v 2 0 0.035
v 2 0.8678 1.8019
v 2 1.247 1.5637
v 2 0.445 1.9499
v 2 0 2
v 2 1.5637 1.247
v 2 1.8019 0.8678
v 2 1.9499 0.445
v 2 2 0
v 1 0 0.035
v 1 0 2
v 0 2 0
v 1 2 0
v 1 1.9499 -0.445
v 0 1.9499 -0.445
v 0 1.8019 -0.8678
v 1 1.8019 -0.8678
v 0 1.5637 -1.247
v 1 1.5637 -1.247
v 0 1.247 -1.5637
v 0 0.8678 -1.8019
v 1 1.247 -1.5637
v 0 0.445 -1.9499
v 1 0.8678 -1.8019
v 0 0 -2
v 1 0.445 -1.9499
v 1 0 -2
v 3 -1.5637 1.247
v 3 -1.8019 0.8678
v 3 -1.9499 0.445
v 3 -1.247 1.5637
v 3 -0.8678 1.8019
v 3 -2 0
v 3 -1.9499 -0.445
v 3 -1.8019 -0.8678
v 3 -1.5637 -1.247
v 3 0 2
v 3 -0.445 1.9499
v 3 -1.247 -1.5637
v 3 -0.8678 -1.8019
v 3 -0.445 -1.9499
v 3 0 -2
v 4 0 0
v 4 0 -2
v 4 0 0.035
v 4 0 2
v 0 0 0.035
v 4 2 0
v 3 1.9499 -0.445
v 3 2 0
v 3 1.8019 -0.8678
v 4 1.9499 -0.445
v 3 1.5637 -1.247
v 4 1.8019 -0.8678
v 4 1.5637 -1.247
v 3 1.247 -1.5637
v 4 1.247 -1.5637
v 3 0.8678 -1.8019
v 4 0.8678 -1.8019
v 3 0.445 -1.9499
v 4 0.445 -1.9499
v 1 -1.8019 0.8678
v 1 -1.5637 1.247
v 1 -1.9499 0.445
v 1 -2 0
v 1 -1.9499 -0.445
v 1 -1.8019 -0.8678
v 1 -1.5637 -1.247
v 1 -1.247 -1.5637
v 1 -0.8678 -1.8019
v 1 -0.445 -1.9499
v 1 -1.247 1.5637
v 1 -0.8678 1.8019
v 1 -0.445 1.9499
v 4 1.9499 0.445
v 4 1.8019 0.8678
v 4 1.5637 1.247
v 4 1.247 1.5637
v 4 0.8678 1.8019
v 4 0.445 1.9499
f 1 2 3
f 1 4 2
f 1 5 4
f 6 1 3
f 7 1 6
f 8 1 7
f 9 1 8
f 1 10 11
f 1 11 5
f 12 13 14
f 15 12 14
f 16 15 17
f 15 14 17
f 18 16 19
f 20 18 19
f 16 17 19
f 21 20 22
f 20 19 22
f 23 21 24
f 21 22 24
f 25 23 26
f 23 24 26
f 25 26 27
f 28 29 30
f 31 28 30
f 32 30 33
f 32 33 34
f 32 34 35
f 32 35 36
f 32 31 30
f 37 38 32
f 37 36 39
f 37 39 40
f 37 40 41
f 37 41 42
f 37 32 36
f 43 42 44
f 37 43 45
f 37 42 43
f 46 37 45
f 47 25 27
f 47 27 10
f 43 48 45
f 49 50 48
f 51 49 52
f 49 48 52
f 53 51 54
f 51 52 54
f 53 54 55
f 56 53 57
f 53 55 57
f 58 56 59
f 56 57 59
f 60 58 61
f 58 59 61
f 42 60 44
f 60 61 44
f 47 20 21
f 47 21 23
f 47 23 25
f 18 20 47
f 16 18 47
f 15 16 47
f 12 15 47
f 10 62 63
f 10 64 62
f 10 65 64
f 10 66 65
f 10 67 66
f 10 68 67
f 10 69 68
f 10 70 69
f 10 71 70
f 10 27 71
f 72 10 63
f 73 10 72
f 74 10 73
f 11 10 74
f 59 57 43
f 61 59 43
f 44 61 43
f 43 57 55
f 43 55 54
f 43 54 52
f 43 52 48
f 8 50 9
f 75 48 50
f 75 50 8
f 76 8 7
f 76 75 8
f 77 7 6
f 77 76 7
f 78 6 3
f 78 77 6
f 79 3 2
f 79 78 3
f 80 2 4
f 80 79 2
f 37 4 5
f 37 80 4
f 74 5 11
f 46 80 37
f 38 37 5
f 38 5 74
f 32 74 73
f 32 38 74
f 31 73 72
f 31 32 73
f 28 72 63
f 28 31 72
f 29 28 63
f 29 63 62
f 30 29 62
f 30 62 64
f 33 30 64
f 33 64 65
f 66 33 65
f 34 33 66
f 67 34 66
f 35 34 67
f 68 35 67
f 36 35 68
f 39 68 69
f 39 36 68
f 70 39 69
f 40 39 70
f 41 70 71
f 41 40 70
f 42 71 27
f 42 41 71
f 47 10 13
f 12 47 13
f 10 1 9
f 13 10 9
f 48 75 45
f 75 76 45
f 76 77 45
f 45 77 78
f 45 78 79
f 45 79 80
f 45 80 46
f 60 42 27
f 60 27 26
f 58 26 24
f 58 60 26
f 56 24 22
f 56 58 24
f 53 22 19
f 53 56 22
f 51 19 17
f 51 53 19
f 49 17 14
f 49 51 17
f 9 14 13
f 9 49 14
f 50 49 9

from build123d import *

# Parameters (mm, degrees)
SKETCH5_W           = 4
SKETCH5_H           = 2
SKETCH6_W           = 1
SKETCH6_H           = 2
CUT_EXTRUDE5_DEPTH  = 11
SKETCH8_W           = 0.5
SKETCH8_H           = 2
CUT_EXTRUDE7_DEPTH  = 10
SKETCH9_W           = 1.5
SKETCH9_H           = 2
CUT_EXTRUDE8_DEPTH  = 10
BOSS_EXTRUDE1_DEPTH = 4
SKETCH13_W          = 4.449870591
SKETCH13_H          = 3.198188742
CUT_EXTRUDE10_DEPTH = 1
SKETCH14_W          = 1
SKETCH14_H          = 2
CUT_EXTRUDE11_DEPTH = 5


with BuildPart() as part:
    # Sketch5 → Revolve-Thin2 (revolve)
    with BuildSketch(Plane.XY):
        with Locations((2, 1)):
            Rectangle(SKETCH5_W, SKETCH5_H)
    revolve(axis=Axis((0, 0, 0), (1, 0, 0)))

    # Sketch6 → Cut-Extrude5 (cut)
    with BuildSketch(Plane.XY):
        with Locations((3.5, 1)):
            Rectangle(SKETCH6_W, SKETCH6_H)
        with Locations((0.5, 1)):
            Rectangle(SKETCH6_W, SKETCH6_H)
    extrude(amount=-CUT_EXTRUDE5_DEPTH, mode=Mode.SUBTRACT)

    # Sketch8 → Cut-Extrude7 (cut)
    with BuildSketch(Plane(origin=(0, 0, 0), x_dir=(-1, 0, 0), z_dir=(0, 0, -1))):
        with Locations((-0.25, 1)):
            Rectangle(SKETCH8_W, SKETCH8_H)
    extrude(amount=-CUT_EXTRUDE7_DEPTH, mode=Mode.SUBTRACT)

    # Sketch9 → Cut-Extrude8 (cut)
    with BuildSketch(Plane(origin=(0, 0, 0), x_dir=(-1, 0, 0), z_dir=(0, 0, -1))):
        with Locations((-1.25, 1)):
            Rectangle(SKETCH9_W, SKETCH9_H)
    extrude(amount=-CUT_EXTRUDE8_DEPTH, mode=Mode.SUBTRACT)

    # Sketch10 → Boss-Extrude1 (add)
    with BuildSketch(Plane(origin=(4, 0, 0), x_dir=(0, 0, -1), z_dir=(1, 0, 0))):
        with BuildLine():
            Line((2, 0), (-0.034977088, 0))
            Line((-0.034977088, 0), (0, 2))
            ThreePointArc((0, 2), (1.414213562, 1.414213562), (2, 0))
        make_face()
    extrude(amount=-BOSS_EXTRUDE1_DEPTH)

    # Sketch13 → Cut-Extrude10 (cut)
    with BuildSketch(Plane.ZY):
        with Locations((-0.224935296, -1.599094371)):
            Rectangle(SKETCH13_W, SKETCH13_H)
    extrude(amount=-CUT_EXTRUDE10_DEPTH, mode=Mode.SUBTRACT)

    # Sketch14 → Cut-Extrude11 (cut, symmetric)
    with BuildSketch(Plane.XY):
        with Locations((3.5, -1)):
            Rectangle(SKETCH14_W, SKETCH14_H)
    extrude(amount=CUT_EXTRUDE11_DEPTH, both=True, mode=Mode.SUBTRACT)


solid = part.part
